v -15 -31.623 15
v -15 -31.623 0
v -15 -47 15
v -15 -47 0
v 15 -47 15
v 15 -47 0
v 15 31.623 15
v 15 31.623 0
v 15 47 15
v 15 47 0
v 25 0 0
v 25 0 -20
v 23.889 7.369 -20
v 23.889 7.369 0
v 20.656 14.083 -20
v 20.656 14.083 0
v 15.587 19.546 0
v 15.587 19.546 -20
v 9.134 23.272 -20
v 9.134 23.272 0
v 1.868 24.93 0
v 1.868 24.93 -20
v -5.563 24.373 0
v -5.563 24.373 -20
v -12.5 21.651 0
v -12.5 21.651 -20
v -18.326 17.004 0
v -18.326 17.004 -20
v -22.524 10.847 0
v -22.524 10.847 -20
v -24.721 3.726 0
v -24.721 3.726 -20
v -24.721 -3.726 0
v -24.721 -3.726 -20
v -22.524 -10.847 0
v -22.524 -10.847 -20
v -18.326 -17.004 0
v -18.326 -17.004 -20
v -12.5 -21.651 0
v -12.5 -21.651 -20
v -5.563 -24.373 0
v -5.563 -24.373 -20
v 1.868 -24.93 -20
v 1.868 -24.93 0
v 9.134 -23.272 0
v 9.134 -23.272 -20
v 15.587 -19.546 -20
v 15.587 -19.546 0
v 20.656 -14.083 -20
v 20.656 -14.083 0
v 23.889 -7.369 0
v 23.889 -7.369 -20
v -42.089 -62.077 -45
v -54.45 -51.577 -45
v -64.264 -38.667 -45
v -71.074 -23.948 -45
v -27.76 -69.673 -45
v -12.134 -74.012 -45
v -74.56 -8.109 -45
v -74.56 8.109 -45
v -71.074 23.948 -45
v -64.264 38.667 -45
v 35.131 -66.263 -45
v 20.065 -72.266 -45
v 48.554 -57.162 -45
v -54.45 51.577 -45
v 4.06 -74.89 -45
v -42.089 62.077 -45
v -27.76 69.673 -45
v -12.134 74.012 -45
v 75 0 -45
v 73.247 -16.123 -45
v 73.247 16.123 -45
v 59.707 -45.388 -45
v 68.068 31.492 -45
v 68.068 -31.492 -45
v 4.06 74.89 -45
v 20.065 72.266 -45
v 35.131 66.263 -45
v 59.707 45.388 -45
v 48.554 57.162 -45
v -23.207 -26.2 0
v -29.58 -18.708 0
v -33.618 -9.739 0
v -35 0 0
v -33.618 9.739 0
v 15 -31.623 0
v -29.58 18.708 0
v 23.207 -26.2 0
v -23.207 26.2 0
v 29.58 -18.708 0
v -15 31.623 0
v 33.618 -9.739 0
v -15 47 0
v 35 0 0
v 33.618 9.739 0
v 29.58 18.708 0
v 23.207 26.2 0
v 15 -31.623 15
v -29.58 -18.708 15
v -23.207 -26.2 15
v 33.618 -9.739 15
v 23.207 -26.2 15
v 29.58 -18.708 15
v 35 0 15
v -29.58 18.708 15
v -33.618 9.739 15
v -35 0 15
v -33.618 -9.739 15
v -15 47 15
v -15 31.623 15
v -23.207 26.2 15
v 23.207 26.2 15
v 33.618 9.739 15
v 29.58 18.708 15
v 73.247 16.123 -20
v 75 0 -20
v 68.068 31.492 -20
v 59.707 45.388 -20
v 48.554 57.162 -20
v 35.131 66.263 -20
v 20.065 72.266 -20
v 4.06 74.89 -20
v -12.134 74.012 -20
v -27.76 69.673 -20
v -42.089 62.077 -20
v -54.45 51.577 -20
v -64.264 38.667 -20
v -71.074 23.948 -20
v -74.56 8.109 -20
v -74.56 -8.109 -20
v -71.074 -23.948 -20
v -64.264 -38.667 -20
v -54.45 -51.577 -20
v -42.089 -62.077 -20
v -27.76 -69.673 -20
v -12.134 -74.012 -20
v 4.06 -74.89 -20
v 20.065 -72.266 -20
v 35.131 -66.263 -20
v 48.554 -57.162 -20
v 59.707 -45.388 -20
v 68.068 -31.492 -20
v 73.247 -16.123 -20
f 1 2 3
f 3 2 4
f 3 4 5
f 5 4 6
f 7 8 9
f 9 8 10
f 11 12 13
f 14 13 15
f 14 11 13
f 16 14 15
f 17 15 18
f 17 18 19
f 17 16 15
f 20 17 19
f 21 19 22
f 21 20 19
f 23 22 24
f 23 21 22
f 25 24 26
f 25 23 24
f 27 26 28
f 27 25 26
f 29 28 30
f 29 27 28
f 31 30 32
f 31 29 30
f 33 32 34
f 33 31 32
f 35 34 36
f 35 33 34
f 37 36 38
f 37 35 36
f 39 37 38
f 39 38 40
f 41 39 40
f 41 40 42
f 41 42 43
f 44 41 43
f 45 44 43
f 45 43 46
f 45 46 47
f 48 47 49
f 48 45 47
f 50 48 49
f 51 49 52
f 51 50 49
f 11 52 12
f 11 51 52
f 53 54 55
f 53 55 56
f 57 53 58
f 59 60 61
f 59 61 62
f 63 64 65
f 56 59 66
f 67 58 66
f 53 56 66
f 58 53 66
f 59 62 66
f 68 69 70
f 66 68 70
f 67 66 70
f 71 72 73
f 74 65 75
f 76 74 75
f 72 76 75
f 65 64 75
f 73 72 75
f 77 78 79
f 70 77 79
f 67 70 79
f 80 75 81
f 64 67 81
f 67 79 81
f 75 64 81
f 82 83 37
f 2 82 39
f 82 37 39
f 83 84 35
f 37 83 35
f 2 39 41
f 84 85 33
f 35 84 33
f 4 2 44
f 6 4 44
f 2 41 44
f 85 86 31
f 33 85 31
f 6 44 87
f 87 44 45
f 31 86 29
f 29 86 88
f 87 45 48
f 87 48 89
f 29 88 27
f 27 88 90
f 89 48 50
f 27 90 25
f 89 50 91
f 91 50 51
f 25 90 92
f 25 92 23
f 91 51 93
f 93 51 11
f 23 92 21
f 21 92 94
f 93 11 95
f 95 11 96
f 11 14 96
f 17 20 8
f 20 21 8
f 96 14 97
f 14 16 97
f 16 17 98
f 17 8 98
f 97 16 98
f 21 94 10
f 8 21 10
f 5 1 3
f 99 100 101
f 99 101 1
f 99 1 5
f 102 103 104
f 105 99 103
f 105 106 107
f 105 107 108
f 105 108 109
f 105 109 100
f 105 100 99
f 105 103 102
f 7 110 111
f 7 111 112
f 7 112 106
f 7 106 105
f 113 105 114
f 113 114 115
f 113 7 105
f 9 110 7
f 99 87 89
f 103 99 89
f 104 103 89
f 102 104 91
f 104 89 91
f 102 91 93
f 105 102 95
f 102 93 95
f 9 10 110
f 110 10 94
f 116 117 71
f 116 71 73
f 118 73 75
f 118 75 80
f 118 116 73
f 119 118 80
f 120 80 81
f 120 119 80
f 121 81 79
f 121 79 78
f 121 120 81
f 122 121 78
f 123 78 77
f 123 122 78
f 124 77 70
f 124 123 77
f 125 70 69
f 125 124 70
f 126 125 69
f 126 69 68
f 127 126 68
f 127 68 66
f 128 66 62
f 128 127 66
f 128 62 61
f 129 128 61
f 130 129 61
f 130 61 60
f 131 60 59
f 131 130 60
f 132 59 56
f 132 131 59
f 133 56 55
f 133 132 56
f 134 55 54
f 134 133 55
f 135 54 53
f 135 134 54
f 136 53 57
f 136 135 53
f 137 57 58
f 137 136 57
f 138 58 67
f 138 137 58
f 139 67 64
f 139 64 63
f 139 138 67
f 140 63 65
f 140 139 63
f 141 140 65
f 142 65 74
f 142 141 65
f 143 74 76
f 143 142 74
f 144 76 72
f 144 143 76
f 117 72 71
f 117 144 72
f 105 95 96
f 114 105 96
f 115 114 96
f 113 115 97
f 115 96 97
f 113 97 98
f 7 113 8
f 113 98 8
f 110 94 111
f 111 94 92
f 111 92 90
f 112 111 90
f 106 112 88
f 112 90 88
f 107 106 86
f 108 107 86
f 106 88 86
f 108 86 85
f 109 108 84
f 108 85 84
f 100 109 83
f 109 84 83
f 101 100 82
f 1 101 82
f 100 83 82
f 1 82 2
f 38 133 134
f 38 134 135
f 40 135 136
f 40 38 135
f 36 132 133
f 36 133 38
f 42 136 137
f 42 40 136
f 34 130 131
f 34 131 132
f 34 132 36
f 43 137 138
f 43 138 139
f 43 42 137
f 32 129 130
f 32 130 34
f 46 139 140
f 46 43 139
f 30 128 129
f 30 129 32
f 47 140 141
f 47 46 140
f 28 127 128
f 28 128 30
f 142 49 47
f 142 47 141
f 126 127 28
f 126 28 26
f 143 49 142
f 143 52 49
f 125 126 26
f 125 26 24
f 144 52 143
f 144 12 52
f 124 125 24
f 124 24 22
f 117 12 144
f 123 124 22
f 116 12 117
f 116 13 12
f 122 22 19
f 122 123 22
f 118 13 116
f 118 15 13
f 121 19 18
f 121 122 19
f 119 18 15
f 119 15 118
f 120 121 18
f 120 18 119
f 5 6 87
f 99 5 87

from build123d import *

# Parameters (mm, degrees)
F1_DEPTH = 15
F2_R     = 25
F3_DEPTH = 20
F5_R     = 75
F6_DEPTH = 25


with BuildPart() as f1:
    # F0 (on Top) → F1 (new body)
    with BuildSketch(Plane.XY):
        with BuildLine():
            ThreePointArc((15, -31.6227766017), (29.5803989155, -18.7082869339), (35, 0))
            ThreePointArc((35, 0), (29.5803989155, 18.7082869339), (15, 31.6227766017))
            Line((15, 31.6227766017), (15, 27.5))
            Line((15, 27.5), (-15, 27.5))
            Line((-15, 27.5), (-15, 31.6227766017))
            ThreePointArc((-15, 31.6227766017), (-35, 0), (-15, -31.6227766017))
            Line((-15, -31.6227766017), (-15, -27.5))
            Line((-15, -27.5), (15, -27.5))
            Line((15, -27.5), (15, -31.6227766017))
        make_face()
        with BuildLine():
            Line((15, 27.5), (15, 31.6227766017))
            ThreePointArc((15, 31.6227766017), (0, 35), (-15, 31.6227766017))
            Line((-15, 31.6227766017), (-15, 27.5))
            Line((-15, 27.5), (15, 27.5))
        make_face()
        with BuildLine():
            ThreePointArc((-15, 31.6227766017), (0, 35), (15, 31.6227766017))
            Line((15, 31.6227766017), (15, 47))
            Line((15, 47), (-15, 47))
            Line((-15, 47), (-15, 31.6227766017))
        make_face()
        with BuildLine():
            Line((15, -47), (15, -31.6227766017))
            ThreePointArc((15, -31.6227766017), (0, -35), (-15, -31.6227766017))
            Line((-15, -31.6227766017), (-15, -47))
            Line((-15, -47), (15, -47))
        make_face()
        with BuildLine():
            ThreePointArc((-15, -31.6227766017), (0, -35), (15, -31.6227766017))
            Line((15, -31.6227766017), (15, -27.5))
            Line((15, -27.5), (-15, -27.5))
            Line((-15, -27.5), (-15, -31.6227766017))
        make_face()
    extrude(amount=F1_DEPTH)

    # F2 (on Top) → F3 (join)
    with BuildSketch(Plane.XY):
        Circle(F2_R)
    extrude(amount=-F3_DEPTH)

    # F5 (on offset) → F6 (join)
    with BuildSketch(Plane.XY.offset(-20)):
        Circle(F5_R)
    extrude(amount=-F6_DEPTH)


solid = f1.part
